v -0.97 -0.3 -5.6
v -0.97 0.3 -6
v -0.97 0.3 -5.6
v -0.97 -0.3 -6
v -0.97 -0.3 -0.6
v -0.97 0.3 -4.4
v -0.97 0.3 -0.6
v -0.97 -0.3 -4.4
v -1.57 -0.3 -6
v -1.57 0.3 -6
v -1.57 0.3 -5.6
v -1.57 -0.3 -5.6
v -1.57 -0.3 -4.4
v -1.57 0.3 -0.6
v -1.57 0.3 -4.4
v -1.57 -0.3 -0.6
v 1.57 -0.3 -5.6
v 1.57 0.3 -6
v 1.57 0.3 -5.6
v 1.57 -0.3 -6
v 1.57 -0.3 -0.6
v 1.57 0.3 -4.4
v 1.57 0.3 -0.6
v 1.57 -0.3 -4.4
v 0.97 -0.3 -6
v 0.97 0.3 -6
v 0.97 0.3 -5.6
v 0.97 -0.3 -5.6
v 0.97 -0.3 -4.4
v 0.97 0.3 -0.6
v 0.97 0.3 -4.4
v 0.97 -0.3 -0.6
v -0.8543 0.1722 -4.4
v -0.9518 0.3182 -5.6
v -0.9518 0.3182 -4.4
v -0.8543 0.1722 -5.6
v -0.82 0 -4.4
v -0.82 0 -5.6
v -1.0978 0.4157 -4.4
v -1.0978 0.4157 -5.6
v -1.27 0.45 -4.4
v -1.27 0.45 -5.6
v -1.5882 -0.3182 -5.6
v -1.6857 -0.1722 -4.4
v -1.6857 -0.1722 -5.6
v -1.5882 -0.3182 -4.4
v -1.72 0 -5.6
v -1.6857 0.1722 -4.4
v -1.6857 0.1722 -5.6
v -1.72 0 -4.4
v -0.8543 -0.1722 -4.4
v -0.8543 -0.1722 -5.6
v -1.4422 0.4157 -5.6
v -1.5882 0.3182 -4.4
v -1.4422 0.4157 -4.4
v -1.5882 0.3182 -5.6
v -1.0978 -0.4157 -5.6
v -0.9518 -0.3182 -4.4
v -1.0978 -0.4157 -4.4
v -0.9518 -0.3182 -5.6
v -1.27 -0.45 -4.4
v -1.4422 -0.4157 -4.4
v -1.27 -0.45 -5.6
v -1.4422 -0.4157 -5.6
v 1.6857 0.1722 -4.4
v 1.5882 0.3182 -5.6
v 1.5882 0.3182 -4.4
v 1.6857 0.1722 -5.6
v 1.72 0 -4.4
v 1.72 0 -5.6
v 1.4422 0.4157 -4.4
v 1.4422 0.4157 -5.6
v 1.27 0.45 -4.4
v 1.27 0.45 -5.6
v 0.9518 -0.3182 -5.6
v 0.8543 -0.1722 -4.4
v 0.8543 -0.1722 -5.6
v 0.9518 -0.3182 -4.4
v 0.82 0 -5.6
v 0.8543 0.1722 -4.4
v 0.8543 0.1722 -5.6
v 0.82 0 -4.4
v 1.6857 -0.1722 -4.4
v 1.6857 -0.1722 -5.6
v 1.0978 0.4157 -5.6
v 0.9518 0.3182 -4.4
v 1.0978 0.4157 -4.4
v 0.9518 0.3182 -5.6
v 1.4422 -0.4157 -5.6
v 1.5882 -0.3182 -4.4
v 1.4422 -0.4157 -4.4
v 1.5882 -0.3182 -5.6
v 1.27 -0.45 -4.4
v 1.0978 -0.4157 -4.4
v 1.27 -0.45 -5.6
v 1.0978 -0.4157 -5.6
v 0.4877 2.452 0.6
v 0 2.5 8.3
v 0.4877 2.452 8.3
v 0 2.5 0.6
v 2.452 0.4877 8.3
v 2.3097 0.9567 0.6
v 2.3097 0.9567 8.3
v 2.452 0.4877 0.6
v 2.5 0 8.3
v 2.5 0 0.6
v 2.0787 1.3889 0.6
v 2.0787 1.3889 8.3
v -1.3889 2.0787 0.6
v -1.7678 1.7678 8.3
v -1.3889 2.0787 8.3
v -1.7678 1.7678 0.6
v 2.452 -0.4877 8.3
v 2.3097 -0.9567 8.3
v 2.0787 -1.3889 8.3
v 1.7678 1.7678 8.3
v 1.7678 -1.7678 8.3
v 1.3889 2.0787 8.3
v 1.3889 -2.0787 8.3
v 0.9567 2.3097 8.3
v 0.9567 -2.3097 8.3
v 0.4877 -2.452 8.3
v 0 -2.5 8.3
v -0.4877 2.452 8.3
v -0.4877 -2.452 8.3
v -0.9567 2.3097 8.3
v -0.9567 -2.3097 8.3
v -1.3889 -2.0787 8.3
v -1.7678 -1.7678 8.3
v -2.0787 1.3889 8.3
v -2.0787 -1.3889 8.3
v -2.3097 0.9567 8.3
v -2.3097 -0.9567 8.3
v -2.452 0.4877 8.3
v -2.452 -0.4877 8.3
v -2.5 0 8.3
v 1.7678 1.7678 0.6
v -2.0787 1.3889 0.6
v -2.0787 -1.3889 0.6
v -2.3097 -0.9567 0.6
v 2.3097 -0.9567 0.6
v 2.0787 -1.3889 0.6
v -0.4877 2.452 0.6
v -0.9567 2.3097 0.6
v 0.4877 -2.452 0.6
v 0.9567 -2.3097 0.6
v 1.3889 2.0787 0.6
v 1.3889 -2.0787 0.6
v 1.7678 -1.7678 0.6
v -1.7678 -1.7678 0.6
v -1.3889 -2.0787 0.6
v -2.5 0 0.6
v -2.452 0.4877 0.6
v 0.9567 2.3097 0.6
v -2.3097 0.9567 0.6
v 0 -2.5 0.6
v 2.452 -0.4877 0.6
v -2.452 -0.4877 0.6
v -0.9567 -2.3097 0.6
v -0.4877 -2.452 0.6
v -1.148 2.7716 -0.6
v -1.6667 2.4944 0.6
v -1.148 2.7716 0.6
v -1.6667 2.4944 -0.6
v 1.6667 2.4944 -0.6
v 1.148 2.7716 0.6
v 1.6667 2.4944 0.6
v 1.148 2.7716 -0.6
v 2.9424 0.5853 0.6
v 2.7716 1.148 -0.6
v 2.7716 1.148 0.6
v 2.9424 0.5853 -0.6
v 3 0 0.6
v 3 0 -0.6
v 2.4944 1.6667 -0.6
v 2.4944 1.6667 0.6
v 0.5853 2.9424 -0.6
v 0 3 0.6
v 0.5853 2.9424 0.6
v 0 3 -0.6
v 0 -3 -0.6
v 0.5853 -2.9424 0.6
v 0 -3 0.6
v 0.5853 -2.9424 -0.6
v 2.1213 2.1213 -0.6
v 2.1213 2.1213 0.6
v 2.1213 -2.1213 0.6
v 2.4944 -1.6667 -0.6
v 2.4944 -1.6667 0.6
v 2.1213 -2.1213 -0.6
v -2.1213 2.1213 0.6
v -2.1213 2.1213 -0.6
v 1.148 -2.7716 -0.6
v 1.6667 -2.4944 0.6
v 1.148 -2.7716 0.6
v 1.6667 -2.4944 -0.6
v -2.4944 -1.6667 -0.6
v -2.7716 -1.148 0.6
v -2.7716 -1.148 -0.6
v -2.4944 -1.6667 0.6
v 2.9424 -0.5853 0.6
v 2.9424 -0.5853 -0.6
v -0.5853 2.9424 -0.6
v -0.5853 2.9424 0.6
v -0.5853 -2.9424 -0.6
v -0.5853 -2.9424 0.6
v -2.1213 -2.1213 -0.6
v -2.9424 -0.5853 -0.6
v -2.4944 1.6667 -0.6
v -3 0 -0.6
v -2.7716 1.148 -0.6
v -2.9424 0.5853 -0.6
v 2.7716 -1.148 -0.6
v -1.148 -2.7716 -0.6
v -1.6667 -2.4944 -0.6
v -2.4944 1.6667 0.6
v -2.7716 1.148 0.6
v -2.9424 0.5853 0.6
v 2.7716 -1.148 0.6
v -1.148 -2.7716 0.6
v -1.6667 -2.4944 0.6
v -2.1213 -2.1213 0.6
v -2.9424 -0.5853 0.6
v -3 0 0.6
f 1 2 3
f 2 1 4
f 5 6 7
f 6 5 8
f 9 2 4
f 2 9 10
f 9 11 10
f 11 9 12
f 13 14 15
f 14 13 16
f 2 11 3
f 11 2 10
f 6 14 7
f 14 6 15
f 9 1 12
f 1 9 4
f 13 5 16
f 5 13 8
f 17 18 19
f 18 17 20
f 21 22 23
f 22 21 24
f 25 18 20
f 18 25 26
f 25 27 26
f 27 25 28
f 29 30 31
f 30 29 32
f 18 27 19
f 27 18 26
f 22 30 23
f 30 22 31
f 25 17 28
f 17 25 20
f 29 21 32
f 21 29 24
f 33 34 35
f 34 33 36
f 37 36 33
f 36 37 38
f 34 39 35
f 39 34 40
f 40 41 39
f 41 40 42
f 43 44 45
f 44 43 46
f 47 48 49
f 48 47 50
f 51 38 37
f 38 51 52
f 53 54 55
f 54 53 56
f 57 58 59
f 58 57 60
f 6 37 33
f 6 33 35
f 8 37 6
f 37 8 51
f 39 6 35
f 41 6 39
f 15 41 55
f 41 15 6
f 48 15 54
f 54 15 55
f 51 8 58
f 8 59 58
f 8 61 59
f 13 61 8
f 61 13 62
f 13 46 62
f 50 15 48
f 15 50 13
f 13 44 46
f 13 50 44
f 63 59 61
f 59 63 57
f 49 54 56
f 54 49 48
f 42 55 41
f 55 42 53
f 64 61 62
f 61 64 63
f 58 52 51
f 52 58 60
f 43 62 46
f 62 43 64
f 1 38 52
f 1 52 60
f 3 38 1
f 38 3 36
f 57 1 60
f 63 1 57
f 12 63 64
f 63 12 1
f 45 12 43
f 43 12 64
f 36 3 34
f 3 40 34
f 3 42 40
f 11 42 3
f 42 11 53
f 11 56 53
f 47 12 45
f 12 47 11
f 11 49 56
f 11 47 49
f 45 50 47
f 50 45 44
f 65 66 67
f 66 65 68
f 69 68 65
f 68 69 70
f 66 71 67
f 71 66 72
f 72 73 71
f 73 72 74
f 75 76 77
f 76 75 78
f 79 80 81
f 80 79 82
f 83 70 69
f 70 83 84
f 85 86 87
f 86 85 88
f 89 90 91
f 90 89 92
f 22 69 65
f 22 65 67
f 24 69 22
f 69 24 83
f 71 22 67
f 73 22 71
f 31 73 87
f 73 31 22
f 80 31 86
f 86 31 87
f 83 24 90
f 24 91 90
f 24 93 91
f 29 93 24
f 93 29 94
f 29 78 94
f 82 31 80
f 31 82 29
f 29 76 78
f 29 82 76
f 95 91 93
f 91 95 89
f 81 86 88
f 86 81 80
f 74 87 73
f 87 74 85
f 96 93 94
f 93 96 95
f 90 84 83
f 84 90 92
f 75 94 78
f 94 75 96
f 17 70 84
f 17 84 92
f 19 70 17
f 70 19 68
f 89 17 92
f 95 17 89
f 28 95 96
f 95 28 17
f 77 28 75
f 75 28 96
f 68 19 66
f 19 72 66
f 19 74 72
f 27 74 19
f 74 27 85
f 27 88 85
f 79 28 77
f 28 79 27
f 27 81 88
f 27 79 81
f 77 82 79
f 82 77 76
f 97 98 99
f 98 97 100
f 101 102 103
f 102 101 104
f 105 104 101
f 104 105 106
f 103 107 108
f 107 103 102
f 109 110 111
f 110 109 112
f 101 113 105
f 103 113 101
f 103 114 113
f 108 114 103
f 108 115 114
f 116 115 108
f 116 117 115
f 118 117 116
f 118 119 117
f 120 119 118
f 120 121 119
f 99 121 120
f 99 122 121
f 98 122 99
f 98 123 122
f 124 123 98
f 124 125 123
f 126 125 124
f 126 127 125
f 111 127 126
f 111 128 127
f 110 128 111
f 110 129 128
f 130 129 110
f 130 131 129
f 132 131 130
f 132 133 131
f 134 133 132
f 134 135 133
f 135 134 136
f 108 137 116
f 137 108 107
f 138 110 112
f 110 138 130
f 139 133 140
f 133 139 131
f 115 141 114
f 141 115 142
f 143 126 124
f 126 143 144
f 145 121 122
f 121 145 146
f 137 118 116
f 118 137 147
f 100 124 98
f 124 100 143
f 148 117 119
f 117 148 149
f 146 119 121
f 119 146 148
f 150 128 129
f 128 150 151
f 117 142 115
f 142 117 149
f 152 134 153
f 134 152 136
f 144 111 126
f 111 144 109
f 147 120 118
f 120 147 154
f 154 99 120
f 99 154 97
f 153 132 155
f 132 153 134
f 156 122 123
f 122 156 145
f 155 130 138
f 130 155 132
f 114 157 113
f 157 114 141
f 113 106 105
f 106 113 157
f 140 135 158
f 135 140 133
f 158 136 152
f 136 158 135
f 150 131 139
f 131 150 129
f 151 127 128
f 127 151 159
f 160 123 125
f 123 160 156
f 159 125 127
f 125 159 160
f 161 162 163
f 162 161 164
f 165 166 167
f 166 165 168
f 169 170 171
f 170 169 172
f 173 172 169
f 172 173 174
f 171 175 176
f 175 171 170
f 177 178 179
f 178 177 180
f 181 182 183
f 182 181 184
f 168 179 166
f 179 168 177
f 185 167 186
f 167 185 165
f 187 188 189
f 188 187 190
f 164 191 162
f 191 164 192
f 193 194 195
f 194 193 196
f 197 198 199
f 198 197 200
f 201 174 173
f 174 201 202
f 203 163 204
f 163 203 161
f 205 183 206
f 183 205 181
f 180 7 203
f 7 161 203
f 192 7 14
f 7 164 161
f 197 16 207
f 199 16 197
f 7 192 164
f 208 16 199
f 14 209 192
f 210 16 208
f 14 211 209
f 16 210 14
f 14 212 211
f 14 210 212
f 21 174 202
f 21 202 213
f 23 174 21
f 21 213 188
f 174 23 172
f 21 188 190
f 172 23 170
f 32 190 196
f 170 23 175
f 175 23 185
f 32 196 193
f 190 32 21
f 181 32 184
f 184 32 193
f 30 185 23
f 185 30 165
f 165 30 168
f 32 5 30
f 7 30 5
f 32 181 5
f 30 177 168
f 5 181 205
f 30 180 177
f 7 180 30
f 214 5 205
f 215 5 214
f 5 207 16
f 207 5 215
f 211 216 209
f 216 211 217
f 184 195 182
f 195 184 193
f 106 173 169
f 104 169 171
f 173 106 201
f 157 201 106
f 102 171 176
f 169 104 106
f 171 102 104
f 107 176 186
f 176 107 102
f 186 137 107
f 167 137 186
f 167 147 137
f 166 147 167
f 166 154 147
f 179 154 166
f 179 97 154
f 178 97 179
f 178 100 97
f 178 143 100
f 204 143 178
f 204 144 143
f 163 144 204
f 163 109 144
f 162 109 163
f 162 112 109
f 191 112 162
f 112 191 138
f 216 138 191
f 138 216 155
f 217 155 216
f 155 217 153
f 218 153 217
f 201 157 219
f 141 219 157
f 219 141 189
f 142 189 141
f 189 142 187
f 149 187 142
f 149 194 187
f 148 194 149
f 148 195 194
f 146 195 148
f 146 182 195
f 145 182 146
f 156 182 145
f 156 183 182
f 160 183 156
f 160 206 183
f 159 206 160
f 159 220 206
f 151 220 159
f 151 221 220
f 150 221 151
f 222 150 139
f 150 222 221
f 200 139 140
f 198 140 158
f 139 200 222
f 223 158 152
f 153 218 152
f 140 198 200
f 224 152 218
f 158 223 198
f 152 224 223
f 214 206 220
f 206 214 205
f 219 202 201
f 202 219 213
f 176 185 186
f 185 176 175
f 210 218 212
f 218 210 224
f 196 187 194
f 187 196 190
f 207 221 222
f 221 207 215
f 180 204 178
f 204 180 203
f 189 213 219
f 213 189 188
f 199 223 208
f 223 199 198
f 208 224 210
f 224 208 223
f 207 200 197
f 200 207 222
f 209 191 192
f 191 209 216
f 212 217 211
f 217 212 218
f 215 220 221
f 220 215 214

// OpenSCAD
// Parameters
led_d = 5; //[3:10:1]
led_height = 8.5; //[5:17:0.5]
rim_thickness = 1.2; //[0.6:2.4:0.1]
rim_d = 6; //[4:12:0.5]
lead_pitch = 2.54; //[1.5:5.08:0.01]
lead_thickness = 0.6; //[0.3:1.2:0.05]
lead = 5; //[2.5:15:0.5]
right_angle = 0; //[0:10:1]
bend_radius = 0.8; //[0.4:2:0.1]
solder_length = 1.2; //[0.6:3:0.1]
solder_d = 0.9; //[0.5:2:0.05]
overlap = 0.8; //[0.5:2:0.1]

// LED Module
module led() {
  color("red") {
    // LED Body
    translate([0, 0, rim_thickness/2 + led_height/2 - overlap])
      cylinder(r=led_d/2, h=led_height, center=true, $fn=32);
    
    // Rim Flange
    translate([0, 0, 0])
      cylinder(r=rim_d/2, h=rim_thickness, center=true, $fn=32);
    
    // Leads
    union() {
      // Left Lead
      translate([-lead_pitch/2, 0, -(lead + overlap)/2 + rim_thickness/2 - overlap])
        cube([lead_thickness, lead_thickness, lead + overlap], center=true);
      
      // Right Lead
      translate([lead_pitch/2, 0, -(lead + overlap)/2 + rim_thickness/2 - overlap])
        cube([lead_thickness, lead_thickness, lead + overlap], center=true);
    }
    
    // Solder Ends
    union() {
      // Left Solder End
      translate([-lead_pitch/2, 0, -lead + rim_thickness/2 - solder_length/2])
        cylinder(r=solder_d/2, h=solder_length, center=true, $fn=16);
      
      // Right Solder End
      translate([lead_pitch/2, 0, -lead + rim_thickness/2 - solder_length/2])
        cylinder(r=solder_d/2, h=solder_length, center=true, $fn=16);
    }
    
    // Right Angle Bend (if applicable)
    if (right_angle > 0) {
      union() {
        // Left Horizontal Bend
        translate([-lead_pitch/2, -right_angle/2 - lead_thickness/2 + overlap, -lead + rim_thickness/2 + lead_thickness/2 - overlap])
          cube([lead_thickness, right_angle, lead_thickness], center=true);
        
        // Right Horizontal Bend
        translate([lead_pitch/2, -right_angle/2 - lead_thickness/2 + overlap, -lead + rim_thickness/2 + lead_thickness/2 - overlap])
          cube([lead_thickness, right_angle, lead_thickness], center=true);
        
        // Left Elbow
        translate([-lead_pitch/2, -lead_thickness/2 + overlap, -lead + rim_thickness/2 + lead_thickness/2 - overlap])
          sphere(r=bend_radius, $fn=16);
        
        // Right Elbow
        translate([lead_pitch/2, -lead_thickness/2 + overlap, -lead + rim_thickness/2 + lead_thickness/2 - overlap])
          sphere(r=bend_radius, $fn=16);
      }
    }
  }
}

// Assembly
module assembly() {
  led();
}

assembly();
